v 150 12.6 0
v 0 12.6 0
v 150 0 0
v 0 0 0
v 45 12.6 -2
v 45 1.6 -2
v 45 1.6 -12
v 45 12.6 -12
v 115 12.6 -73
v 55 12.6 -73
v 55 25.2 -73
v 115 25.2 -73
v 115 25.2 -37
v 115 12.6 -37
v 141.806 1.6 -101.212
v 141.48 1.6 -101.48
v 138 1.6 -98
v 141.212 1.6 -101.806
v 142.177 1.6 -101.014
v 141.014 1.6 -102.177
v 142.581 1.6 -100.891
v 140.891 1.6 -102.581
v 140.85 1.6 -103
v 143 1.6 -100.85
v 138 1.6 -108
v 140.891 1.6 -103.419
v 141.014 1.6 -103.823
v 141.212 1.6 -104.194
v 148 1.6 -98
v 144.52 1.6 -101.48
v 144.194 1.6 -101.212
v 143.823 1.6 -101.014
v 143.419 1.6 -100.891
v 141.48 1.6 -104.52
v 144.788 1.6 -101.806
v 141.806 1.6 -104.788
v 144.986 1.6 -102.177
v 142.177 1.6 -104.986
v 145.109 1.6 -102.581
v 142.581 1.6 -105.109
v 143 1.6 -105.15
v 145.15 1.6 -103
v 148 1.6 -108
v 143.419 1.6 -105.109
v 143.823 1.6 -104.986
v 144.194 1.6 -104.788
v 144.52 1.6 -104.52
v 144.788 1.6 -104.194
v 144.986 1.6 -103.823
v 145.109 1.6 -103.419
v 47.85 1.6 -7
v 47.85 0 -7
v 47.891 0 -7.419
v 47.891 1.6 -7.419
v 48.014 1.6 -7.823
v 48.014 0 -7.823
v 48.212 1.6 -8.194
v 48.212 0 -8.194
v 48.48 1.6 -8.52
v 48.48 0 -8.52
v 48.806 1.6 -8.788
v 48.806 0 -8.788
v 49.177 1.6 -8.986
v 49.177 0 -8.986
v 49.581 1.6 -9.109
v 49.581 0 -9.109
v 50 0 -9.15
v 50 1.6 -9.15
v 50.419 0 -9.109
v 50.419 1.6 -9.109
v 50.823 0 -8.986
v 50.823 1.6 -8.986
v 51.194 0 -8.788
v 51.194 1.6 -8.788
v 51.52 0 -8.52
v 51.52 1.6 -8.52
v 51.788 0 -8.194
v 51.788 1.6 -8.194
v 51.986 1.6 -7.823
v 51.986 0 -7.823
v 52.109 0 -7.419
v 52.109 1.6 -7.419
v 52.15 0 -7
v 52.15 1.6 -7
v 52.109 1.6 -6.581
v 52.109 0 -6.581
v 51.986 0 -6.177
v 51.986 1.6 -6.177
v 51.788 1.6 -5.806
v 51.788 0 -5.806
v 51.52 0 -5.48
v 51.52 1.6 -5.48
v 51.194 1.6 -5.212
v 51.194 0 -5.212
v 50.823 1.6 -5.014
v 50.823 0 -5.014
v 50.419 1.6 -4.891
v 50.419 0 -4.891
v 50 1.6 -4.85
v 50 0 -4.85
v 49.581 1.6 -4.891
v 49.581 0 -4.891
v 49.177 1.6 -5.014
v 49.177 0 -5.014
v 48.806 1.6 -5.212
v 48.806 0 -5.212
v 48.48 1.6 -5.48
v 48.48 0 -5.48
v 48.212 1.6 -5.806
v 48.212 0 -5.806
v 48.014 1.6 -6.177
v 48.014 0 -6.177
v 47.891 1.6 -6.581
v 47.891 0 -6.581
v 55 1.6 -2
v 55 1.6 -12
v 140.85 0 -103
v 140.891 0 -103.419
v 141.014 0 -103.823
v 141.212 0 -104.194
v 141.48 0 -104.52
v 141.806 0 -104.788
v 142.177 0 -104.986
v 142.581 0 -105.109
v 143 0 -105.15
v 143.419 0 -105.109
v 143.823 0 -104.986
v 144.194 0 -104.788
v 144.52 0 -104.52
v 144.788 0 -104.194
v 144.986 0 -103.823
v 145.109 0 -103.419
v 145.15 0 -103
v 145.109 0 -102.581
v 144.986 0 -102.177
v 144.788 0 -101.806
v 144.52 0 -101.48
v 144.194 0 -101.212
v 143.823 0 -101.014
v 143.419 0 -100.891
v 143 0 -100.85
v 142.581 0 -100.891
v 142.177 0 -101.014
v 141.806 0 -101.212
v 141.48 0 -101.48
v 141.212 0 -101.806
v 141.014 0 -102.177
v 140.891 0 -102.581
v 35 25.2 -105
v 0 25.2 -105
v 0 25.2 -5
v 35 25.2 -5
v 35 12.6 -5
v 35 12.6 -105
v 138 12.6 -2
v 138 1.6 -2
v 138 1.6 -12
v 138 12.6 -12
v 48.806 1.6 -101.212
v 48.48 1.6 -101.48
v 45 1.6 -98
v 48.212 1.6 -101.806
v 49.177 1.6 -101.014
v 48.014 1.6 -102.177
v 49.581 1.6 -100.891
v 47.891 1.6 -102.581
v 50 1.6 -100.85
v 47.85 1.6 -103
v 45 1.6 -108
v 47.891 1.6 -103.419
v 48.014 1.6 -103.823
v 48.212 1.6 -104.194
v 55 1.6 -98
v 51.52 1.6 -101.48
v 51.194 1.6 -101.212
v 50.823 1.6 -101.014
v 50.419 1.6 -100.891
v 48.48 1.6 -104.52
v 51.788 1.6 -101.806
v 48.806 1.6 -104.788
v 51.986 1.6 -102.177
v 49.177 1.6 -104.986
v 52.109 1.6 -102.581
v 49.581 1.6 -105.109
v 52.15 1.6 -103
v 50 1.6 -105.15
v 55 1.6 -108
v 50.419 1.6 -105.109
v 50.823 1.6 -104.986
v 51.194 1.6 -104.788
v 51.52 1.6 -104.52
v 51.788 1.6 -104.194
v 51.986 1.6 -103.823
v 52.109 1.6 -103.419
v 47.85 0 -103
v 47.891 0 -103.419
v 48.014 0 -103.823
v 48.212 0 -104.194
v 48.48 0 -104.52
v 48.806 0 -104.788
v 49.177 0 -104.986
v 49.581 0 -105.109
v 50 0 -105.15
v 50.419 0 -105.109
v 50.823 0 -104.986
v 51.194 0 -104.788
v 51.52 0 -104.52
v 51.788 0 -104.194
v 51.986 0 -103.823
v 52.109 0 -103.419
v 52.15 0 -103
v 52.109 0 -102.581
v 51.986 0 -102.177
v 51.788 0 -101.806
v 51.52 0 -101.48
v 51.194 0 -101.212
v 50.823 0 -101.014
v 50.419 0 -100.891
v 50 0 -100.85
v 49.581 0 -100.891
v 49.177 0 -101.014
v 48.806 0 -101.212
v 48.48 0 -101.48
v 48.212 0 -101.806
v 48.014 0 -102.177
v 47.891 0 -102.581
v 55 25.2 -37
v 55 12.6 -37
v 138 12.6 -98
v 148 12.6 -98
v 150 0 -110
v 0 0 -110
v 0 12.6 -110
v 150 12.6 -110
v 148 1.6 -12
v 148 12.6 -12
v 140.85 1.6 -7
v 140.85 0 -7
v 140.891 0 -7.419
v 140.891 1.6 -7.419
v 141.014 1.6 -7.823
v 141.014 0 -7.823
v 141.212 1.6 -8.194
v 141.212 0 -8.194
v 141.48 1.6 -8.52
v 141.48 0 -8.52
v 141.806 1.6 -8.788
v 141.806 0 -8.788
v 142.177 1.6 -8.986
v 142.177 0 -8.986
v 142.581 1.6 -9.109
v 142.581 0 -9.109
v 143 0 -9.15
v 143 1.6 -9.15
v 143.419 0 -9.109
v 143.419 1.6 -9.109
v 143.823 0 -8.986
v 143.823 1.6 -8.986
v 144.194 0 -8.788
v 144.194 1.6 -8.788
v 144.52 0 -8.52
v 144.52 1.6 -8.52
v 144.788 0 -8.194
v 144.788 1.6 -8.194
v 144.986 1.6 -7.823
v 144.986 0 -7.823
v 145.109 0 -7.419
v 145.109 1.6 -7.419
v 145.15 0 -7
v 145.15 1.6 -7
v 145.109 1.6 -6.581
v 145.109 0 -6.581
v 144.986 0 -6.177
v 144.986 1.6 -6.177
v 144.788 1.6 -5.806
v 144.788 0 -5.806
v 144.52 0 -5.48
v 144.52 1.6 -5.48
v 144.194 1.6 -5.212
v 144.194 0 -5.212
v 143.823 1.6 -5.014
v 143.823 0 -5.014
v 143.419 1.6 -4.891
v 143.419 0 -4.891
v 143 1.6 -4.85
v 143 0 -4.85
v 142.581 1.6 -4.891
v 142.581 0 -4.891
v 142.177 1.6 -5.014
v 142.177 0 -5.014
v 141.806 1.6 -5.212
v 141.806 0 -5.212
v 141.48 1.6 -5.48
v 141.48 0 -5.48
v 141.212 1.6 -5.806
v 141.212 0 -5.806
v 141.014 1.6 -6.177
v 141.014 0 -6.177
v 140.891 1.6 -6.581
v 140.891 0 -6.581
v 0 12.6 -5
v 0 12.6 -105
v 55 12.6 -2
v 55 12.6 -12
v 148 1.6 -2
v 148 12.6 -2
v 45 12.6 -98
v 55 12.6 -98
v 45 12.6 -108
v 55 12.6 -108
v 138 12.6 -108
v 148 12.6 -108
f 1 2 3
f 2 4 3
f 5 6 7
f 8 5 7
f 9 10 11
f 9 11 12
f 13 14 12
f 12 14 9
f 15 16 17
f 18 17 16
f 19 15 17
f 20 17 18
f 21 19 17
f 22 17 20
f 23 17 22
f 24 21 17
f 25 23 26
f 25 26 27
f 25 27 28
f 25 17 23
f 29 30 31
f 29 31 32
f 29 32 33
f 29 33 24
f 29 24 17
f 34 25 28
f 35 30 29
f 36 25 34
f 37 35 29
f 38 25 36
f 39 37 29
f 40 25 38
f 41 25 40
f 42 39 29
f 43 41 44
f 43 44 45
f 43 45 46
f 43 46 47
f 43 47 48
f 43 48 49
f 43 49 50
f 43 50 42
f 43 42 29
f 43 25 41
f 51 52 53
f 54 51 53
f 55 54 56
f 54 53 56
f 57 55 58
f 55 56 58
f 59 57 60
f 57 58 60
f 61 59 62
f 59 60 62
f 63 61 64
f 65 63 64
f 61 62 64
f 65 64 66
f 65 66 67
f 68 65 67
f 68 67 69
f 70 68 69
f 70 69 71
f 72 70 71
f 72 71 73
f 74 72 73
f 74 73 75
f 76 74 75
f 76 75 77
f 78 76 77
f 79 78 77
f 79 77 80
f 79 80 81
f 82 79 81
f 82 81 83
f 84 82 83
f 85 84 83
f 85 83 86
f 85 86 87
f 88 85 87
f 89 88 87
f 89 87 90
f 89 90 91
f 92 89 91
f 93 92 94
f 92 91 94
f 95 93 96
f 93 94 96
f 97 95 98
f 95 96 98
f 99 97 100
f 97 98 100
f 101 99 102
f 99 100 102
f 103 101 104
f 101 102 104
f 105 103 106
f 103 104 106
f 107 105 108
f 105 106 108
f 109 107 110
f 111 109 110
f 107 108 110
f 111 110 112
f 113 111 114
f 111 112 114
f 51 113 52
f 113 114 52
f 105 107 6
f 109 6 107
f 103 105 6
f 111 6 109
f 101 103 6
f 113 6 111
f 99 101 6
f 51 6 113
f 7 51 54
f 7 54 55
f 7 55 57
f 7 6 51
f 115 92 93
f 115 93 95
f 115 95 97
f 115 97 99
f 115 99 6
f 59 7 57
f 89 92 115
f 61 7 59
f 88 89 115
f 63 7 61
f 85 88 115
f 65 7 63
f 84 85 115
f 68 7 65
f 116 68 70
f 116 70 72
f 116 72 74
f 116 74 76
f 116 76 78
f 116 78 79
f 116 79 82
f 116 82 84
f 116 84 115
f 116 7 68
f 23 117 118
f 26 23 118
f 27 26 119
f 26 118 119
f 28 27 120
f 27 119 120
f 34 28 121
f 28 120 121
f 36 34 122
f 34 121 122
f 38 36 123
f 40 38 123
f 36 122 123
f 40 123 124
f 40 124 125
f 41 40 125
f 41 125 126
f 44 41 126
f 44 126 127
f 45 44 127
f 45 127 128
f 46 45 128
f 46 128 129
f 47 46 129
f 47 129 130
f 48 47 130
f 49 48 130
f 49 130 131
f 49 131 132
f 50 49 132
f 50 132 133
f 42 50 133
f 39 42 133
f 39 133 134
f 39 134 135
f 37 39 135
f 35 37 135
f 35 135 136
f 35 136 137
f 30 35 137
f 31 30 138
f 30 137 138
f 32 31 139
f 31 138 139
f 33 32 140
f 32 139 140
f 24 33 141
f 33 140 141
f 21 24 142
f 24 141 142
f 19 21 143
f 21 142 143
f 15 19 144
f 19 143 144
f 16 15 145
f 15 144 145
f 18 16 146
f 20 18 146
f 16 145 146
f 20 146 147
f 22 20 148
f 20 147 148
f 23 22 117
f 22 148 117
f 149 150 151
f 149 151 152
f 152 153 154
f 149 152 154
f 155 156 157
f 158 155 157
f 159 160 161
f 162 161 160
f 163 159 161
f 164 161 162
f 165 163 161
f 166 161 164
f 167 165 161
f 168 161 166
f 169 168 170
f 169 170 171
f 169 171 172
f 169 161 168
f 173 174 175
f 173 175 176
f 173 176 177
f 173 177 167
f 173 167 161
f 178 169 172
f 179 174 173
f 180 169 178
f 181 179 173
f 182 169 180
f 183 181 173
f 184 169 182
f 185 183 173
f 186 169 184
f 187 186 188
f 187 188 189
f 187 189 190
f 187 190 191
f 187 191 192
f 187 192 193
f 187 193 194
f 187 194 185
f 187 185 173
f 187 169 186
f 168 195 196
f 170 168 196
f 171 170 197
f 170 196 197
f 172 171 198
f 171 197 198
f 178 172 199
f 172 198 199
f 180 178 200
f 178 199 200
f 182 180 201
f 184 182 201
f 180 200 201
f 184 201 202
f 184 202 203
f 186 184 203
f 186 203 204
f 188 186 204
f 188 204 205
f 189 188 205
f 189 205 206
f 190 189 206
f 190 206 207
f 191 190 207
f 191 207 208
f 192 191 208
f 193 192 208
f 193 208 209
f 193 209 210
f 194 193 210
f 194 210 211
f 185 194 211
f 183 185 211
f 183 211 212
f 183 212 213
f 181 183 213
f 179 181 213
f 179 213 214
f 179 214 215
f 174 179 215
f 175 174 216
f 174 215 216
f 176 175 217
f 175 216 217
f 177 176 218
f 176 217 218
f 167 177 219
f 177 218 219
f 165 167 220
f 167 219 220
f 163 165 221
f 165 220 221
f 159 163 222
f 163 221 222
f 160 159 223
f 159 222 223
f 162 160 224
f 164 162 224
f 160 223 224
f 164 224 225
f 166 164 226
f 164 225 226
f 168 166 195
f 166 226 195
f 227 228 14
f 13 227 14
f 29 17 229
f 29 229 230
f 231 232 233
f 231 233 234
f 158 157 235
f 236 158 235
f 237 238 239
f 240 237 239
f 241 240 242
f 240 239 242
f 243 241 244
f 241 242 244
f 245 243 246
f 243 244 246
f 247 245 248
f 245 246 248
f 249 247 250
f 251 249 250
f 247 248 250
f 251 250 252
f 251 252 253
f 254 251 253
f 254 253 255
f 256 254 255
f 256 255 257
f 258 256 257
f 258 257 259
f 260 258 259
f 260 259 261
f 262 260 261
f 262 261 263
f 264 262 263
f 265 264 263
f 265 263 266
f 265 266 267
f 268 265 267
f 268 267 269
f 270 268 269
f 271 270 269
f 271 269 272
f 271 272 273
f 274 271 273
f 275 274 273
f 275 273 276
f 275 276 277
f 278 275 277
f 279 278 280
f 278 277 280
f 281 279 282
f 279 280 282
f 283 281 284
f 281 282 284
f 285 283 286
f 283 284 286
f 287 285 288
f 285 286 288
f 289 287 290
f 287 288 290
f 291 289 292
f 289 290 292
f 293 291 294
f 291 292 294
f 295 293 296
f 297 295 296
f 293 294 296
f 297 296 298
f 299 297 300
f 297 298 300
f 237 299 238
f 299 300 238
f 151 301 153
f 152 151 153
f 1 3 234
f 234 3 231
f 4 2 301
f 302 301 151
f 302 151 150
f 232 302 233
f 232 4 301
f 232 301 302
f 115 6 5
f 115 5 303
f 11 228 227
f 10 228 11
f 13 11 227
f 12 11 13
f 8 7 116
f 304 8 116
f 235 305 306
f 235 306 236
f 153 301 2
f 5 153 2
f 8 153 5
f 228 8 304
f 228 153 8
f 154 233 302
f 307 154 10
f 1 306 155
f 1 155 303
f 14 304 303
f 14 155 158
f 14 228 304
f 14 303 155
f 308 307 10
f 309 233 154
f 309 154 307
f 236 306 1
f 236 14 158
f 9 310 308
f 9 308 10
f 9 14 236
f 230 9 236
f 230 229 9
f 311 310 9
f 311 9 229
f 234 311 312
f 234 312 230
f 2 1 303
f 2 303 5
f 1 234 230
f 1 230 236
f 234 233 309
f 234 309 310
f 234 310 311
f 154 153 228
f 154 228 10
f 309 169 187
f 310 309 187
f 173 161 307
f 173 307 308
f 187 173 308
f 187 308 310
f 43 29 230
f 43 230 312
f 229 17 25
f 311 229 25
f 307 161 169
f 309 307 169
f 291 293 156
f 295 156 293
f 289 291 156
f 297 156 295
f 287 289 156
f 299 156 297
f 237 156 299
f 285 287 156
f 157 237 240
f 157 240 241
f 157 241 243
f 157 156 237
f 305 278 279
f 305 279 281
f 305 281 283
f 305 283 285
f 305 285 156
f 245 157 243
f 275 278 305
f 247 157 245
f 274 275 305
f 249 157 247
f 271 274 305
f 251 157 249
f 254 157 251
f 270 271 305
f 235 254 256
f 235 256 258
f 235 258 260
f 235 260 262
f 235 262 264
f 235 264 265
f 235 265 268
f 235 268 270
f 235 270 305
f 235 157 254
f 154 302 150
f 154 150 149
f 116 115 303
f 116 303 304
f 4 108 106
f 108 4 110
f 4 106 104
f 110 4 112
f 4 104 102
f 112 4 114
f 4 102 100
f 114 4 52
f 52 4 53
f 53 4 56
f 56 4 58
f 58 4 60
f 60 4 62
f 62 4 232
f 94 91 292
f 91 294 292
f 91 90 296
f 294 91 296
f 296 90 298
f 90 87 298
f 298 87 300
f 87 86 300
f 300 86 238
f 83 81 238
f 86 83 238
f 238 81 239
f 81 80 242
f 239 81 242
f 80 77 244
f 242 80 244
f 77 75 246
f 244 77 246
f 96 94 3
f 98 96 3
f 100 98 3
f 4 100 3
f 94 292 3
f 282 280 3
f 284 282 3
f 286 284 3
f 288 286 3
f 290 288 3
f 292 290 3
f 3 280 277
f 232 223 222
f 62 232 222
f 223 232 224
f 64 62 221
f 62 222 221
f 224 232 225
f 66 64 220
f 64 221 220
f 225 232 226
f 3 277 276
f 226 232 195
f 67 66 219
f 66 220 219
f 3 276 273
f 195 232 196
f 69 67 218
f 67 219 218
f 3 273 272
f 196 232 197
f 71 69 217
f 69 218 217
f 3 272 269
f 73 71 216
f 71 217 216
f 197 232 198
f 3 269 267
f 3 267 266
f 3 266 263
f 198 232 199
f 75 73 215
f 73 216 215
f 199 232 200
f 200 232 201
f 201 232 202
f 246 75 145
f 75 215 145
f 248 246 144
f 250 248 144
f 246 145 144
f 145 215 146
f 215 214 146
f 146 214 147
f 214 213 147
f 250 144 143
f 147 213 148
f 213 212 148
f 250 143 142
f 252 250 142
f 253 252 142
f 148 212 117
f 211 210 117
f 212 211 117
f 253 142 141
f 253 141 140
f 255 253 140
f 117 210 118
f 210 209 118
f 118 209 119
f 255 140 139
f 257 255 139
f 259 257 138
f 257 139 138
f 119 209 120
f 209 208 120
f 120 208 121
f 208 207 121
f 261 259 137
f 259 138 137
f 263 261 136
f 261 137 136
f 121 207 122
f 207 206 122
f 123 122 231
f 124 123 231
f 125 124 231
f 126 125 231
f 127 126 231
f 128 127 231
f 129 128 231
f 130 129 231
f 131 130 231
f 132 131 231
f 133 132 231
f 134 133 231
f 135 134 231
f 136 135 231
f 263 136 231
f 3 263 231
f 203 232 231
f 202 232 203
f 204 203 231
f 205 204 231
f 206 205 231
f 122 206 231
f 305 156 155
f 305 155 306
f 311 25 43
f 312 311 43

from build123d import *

# Parameters (mm, degrees)
SKETCH1_W                  = 150
SKETCH1_H                  = 110
BOSS_EXTRUDE1_DEPTH        = 1.6
SKETCH2_W                  = 150
SKETCH2_H                  = 110
SKETCH2_W_2                = 10
SKETCH2_H_2                = 10
BOSS_EXTRUDE2_DEPTH        = 11
F_4_0_4_3_DIAMETER_HOLE1_D = 4.3
SKETCH3_W                  = 35
SKETCH3_H                  = 100
BOSS_EXTRUDE3_DEPTH        = 12.6
SKETCH4_W                  = 60
SKETCH4_H                  = 36
BOSS_EXTRUDE4_DEPTH        = 12.6


with BuildPart() as part:
    # Sketch1 → Boss-Extrude1 (new body)
    with BuildSketch(Plane(origin=(0, 0, 0), x_dir=(1, 0, 0), z_dir=(0, 1, 0))):
        with Locations((75, 55)):
            Rectangle(SKETCH1_W, SKETCH1_H)
    extrude(amount=BOSS_EXTRUDE1_DEPTH)

    # Sketch2 → Boss-Extrude2 (add)
    with BuildSketch(Plane(origin=(0, 1.6, 0), x_dir=(1, 0, 0), z_dir=(0, 1, 0))):
        with Locations((75, 55)):
            Rectangle(SKETCH2_W, SKETCH2_H)
        with Locations((50, 103)):
            Rectangle(SKETCH2_W_2, SKETCH2_H_2, mode=Mode.SUBTRACT)
        with Locations((143, 103)):
            Rectangle(SKETCH2_W_2, SKETCH2_H_2, mode=Mode.SUBTRACT)
        with Locations((143, 7)):
            Rectangle(SKETCH2_W_2, SKETCH2_H_2, mode=Mode.SUBTRACT)
        with Locations((50, 7)):
            Rectangle(SKETCH2_W_2, SKETCH2_H_2, mode=Mode.SUBTRACT)
    extrude(amount=BOSS_EXTRUDE2_DEPTH)

    # Ø4.0 (4.3) Diameter Hole1 (through all)
    with Locations(Plane(origin=(0, 1.6, 0), x_dir=(1, 0, 0), z_dir=(0, 1, 0))):
        with Locations((143, 103), (50, 103), (50, 7), (143, 7)):
            Hole(F_4_0_4_3_DIAMETER_HOLE1_D / 2)

    # Sketch3 → Boss-Extrude3 (add)
    with BuildSketch(Plane(origin=(0, 12.6, 0), x_dir=(1, 0, 0), z_dir=(0, 1, 0))):
        with Locations((17.5, 55)):
            Rectangle(SKETCH3_W, SKETCH3_H)
    extrude(amount=BOSS_EXTRUDE3_DEPTH)

    # Sketch4 → Boss-Extrude4 (add)
    with BuildSketch(Plane(origin=(0, 12.6, 0), x_dir=(1, 0, 0), z_dir=(0, 1, 0))):
        with Locations((85, 55)):
            Rectangle(SKETCH4_W, SKETCH4_H)
    extrude(amount=BOSS_EXTRUDE4_DEPTH)


solid = part.part
